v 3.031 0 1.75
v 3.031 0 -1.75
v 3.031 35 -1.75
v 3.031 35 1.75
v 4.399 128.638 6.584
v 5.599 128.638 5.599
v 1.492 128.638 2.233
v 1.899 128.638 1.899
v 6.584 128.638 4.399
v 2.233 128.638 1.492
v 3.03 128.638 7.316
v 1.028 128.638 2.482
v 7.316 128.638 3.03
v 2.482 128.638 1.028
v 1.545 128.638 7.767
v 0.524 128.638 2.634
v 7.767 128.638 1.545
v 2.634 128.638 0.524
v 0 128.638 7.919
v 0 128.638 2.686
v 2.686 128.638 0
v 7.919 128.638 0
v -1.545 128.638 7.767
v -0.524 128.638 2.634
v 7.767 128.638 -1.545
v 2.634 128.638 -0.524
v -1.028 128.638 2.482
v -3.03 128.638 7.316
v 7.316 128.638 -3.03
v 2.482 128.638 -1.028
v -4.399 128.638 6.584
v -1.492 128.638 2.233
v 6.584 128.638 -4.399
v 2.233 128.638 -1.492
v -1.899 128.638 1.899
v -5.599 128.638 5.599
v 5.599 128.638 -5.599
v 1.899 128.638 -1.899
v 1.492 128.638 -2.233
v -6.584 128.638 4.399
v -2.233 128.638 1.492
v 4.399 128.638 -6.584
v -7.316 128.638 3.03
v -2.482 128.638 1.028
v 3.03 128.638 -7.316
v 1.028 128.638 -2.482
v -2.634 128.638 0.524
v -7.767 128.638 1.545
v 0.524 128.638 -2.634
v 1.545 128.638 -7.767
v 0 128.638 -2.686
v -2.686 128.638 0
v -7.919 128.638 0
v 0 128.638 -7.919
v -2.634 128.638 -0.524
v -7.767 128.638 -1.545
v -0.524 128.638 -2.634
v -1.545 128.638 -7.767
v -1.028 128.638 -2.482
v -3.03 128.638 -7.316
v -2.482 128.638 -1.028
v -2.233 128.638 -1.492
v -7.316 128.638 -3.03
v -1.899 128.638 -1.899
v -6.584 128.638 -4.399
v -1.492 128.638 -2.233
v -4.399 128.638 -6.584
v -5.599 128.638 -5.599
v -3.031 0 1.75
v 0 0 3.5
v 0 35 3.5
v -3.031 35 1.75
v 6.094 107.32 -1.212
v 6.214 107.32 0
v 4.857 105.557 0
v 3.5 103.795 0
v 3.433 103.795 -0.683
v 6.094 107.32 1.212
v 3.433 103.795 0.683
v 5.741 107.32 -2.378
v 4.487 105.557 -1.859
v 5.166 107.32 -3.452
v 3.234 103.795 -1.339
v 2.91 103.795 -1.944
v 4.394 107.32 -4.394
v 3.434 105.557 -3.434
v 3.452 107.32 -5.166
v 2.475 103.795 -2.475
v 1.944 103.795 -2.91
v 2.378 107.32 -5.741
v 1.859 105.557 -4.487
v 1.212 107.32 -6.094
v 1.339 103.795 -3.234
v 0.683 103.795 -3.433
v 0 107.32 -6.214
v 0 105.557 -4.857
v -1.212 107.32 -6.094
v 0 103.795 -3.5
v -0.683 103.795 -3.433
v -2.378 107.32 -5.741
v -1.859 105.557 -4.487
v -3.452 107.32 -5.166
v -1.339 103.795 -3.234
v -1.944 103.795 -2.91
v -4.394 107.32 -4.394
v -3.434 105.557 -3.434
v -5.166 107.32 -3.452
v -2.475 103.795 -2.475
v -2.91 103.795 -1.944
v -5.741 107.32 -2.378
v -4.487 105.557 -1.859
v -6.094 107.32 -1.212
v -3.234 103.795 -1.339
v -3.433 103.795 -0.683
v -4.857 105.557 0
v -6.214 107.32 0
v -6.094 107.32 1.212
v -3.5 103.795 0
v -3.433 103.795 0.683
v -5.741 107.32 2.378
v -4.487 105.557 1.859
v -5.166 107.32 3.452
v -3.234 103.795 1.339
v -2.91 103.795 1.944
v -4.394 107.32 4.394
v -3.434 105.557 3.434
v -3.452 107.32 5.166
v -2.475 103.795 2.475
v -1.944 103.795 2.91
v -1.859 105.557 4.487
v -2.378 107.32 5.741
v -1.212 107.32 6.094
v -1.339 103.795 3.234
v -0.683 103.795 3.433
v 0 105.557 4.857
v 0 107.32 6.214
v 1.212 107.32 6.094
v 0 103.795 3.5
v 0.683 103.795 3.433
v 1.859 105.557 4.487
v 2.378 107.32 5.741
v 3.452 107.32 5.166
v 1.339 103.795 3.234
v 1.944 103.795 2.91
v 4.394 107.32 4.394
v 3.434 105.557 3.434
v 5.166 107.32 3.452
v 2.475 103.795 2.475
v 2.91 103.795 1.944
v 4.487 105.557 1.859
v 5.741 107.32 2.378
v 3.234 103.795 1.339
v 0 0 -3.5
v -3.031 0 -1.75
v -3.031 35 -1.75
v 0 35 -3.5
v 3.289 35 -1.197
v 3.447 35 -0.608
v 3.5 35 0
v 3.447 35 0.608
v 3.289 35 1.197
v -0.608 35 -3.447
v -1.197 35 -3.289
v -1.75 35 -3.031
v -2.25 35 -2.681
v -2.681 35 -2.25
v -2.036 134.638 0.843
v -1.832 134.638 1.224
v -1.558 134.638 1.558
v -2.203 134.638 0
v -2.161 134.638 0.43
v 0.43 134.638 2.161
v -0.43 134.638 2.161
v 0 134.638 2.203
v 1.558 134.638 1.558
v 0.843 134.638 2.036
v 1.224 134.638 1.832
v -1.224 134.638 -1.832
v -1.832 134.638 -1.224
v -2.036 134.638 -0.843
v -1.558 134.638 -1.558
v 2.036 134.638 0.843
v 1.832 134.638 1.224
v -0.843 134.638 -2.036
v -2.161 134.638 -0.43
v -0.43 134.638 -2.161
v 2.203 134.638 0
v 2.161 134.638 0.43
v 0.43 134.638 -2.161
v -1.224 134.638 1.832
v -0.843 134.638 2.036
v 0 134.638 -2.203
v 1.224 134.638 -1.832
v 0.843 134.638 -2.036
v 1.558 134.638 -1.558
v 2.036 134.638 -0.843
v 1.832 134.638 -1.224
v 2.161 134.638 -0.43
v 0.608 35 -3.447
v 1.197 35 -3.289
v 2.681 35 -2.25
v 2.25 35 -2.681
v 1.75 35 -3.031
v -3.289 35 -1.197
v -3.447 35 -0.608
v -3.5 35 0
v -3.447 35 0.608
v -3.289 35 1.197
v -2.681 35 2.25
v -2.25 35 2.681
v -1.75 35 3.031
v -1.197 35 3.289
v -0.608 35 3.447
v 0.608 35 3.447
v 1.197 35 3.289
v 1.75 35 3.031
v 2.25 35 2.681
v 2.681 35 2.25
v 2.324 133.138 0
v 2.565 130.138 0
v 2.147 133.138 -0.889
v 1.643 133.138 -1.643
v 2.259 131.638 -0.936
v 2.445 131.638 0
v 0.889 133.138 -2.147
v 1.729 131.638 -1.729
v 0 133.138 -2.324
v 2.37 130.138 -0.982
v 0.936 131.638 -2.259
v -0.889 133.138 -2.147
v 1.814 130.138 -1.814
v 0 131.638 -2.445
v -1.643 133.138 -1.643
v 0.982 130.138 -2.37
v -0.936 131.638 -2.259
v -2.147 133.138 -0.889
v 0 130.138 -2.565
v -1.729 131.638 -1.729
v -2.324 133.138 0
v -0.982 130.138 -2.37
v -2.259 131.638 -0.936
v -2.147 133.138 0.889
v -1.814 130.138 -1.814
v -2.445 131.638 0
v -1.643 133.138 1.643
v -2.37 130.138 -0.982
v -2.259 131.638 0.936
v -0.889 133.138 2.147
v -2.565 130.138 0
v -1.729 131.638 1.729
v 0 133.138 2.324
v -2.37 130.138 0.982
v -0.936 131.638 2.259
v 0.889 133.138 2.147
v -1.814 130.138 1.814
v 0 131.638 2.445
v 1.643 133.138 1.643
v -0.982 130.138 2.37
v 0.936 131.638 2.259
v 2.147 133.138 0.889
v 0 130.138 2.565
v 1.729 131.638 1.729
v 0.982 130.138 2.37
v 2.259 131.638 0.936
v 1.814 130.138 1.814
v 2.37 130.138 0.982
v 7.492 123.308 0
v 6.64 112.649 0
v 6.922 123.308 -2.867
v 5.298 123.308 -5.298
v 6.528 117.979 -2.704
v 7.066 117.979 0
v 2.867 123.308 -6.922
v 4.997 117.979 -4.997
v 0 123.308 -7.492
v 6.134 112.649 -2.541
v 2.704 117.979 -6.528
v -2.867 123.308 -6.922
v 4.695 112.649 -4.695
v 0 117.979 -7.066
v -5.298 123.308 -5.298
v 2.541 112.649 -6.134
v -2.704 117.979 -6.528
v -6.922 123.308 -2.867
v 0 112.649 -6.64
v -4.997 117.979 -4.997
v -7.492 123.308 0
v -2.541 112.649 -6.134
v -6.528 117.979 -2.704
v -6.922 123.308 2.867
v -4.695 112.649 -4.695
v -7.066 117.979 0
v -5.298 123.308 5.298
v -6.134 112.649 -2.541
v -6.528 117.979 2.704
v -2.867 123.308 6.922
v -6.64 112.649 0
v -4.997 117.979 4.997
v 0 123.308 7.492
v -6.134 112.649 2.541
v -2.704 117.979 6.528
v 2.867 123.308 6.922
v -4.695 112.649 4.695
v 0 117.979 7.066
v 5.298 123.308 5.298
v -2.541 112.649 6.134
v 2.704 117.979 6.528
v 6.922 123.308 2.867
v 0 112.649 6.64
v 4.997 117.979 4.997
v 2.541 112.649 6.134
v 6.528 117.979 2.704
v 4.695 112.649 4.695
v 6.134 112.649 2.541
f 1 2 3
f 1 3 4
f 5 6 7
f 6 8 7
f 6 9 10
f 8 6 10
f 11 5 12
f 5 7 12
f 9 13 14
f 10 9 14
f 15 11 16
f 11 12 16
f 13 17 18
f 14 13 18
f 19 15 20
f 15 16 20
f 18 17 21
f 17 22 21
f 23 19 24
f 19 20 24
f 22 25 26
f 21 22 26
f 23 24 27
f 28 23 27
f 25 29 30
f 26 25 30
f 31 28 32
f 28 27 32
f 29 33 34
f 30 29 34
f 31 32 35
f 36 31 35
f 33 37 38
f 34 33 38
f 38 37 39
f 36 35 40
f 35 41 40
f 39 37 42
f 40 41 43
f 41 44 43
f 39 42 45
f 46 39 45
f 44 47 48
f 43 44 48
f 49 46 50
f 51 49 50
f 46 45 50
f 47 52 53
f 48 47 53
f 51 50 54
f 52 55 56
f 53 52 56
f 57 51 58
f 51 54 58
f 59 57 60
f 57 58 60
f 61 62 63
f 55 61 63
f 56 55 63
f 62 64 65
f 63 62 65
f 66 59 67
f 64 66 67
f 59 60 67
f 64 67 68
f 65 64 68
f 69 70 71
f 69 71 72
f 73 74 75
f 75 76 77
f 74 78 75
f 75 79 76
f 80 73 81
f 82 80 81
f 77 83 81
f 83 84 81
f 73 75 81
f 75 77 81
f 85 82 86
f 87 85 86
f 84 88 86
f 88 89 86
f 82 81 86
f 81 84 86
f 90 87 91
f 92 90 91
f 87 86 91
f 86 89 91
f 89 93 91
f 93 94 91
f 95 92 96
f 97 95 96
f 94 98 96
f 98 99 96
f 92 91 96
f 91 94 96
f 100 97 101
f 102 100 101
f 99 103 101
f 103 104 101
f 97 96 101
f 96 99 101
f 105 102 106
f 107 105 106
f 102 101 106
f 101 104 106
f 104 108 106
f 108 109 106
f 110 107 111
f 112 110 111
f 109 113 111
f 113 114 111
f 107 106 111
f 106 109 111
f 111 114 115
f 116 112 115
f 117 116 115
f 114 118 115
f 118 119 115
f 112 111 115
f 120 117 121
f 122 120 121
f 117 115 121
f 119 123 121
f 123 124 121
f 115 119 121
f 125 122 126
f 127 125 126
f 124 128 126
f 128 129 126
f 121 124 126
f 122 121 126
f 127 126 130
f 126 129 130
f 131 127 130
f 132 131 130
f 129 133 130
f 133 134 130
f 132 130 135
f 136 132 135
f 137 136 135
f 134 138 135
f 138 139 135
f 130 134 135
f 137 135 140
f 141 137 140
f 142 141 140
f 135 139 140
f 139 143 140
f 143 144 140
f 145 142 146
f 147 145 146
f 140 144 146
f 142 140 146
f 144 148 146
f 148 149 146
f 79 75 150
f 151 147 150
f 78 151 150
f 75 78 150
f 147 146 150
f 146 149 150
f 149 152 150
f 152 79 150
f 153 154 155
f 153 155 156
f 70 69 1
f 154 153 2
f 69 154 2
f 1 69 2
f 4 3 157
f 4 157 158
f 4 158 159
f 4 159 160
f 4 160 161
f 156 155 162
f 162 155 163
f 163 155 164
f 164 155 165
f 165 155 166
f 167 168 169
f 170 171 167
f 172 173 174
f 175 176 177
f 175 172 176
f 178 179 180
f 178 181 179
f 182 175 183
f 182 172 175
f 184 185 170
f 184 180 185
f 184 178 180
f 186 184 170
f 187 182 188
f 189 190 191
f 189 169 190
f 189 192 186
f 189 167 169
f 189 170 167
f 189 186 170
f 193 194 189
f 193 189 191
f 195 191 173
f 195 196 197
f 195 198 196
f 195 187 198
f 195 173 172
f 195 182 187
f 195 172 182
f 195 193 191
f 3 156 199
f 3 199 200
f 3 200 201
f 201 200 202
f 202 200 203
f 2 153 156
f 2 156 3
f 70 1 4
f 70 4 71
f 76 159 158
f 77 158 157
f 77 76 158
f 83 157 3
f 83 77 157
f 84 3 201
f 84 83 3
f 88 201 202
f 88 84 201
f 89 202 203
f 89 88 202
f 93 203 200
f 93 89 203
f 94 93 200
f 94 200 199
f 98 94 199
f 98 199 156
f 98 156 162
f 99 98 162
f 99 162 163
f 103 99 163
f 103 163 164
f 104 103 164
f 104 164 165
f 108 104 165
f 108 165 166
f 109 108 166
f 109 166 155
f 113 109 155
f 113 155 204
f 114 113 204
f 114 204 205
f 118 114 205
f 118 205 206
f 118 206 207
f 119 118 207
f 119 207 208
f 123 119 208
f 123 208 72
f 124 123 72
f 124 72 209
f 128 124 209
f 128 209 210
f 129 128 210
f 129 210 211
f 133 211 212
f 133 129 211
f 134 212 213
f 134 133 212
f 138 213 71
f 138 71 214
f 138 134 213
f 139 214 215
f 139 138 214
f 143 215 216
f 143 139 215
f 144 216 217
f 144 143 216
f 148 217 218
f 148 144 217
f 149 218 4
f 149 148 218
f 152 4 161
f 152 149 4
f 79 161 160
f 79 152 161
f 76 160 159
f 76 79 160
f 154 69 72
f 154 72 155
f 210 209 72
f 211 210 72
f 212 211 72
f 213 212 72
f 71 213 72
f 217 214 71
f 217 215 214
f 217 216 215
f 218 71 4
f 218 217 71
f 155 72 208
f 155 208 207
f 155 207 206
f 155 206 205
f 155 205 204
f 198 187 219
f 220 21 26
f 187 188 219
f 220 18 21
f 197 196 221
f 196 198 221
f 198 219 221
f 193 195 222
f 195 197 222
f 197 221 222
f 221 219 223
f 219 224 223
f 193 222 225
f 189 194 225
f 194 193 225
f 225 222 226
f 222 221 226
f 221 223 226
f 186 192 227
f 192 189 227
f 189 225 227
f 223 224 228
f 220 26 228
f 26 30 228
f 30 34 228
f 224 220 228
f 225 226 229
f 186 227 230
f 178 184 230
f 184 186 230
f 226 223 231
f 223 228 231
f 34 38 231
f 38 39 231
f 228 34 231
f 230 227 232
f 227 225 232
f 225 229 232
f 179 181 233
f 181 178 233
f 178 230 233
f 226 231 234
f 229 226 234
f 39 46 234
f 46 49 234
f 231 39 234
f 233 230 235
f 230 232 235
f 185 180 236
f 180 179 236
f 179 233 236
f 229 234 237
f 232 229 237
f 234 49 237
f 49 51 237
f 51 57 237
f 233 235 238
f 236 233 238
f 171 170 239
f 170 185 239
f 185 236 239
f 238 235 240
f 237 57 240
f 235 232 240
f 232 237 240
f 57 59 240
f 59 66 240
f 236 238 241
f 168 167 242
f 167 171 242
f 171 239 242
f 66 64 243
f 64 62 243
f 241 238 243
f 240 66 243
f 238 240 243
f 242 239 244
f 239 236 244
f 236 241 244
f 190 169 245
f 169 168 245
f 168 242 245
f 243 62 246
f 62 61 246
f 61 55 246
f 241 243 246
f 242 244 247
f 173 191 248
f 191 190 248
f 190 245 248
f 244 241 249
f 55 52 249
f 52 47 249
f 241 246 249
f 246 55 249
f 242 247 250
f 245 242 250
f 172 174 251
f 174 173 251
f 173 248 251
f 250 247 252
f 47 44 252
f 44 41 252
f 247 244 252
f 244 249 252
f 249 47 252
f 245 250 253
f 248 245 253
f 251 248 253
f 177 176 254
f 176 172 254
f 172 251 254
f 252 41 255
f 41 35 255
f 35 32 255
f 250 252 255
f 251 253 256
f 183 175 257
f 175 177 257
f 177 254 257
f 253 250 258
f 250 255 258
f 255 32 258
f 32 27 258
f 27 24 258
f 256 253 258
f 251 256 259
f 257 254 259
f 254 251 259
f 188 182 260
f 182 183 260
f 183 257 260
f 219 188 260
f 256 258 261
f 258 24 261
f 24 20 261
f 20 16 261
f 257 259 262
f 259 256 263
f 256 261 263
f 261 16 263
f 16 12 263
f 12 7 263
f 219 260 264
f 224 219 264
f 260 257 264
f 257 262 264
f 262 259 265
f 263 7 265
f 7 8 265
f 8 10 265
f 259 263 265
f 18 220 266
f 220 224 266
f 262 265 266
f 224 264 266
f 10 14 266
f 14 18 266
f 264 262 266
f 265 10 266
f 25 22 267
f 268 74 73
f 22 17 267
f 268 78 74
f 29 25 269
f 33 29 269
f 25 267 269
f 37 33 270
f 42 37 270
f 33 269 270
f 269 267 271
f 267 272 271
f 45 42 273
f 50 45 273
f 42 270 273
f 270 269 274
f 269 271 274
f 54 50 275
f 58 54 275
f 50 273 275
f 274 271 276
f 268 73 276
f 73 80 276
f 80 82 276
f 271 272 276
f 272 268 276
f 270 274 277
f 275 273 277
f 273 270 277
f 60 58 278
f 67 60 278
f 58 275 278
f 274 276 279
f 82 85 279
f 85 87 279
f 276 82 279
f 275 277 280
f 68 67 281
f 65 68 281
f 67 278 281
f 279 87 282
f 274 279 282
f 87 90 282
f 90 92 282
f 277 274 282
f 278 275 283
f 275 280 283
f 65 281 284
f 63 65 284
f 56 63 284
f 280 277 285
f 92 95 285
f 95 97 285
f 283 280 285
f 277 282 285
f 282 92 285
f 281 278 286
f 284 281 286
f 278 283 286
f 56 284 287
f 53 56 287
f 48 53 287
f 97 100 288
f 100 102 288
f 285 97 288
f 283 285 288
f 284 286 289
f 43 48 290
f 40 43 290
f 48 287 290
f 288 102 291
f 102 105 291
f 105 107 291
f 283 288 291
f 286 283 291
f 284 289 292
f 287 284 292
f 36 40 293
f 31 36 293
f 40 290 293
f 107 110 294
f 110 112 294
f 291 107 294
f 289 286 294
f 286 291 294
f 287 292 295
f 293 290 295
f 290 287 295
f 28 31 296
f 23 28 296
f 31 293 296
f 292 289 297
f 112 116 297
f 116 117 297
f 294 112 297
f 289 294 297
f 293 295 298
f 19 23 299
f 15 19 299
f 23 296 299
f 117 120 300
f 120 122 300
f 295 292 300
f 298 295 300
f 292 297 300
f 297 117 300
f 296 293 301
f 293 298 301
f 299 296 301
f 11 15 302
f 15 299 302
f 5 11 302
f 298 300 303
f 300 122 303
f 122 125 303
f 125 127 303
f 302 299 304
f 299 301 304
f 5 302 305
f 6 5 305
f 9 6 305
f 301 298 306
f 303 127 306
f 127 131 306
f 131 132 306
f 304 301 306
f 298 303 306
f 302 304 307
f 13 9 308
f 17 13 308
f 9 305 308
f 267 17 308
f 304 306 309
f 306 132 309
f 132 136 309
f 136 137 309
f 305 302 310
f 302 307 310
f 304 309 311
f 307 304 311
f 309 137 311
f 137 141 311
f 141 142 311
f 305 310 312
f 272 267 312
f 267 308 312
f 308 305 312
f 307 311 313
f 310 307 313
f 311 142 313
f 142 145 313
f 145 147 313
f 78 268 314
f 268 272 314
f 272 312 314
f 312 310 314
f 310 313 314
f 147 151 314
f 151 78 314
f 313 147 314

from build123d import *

# Parameters (mm, degrees)
SKETCH2_R          = 4.388085687
CUT_EXTRUDE1_DEPTH = 35
SKETCH4_R          = 12.137505268
CUT_EXTRUDE2_DEPTH = 19.362331983


with BuildPart() as part:
    # Sketch1 → Revolve1 (revolve)
    with BuildSketch(Plane.XY):
        Polygon((0, 0), (0, 153), (0.726418921, 153), (2.686091777, 128.637668017), (7.918657935, 128.637668017), (6.213660545, 107.320079818), (3.5, 103.794837091), (3.5, 55), (3.5, 53), (3.5, 0), align=None)
    revolve(axis=Axis((0, 0, 0), (0, 1, 0)))

    # Sketch2 → Cut-Extrude1 (cut)
    with BuildSketch(Plane.XZ):
        Circle(SKETCH2_R)
        Polygon((0, 3.5), (-3.031088913, 1.75), (-3.031088913, -1.75), (0, -3.5), (3.031088913, -1.75), (3.031088913, 1.75), align=None, mode=Mode.SUBTRACT)
    extrude(amount=-CUT_EXTRUDE1_DEPTH, mode=Mode.SUBTRACT)

    # Sketch4 → Cut-Extrude2 (cut, through all)
    with BuildSketch(Plane(origin=(0, 134.637668017, 0), x_dir=(1, 0, 0), z_dir=(0, 1, 0))):
        Circle(SKETCH4_R)
    extrude(amount=CUT_EXTRUDE2_DEPTH, mode=Mode.SUBTRACT)


solid = part.part
